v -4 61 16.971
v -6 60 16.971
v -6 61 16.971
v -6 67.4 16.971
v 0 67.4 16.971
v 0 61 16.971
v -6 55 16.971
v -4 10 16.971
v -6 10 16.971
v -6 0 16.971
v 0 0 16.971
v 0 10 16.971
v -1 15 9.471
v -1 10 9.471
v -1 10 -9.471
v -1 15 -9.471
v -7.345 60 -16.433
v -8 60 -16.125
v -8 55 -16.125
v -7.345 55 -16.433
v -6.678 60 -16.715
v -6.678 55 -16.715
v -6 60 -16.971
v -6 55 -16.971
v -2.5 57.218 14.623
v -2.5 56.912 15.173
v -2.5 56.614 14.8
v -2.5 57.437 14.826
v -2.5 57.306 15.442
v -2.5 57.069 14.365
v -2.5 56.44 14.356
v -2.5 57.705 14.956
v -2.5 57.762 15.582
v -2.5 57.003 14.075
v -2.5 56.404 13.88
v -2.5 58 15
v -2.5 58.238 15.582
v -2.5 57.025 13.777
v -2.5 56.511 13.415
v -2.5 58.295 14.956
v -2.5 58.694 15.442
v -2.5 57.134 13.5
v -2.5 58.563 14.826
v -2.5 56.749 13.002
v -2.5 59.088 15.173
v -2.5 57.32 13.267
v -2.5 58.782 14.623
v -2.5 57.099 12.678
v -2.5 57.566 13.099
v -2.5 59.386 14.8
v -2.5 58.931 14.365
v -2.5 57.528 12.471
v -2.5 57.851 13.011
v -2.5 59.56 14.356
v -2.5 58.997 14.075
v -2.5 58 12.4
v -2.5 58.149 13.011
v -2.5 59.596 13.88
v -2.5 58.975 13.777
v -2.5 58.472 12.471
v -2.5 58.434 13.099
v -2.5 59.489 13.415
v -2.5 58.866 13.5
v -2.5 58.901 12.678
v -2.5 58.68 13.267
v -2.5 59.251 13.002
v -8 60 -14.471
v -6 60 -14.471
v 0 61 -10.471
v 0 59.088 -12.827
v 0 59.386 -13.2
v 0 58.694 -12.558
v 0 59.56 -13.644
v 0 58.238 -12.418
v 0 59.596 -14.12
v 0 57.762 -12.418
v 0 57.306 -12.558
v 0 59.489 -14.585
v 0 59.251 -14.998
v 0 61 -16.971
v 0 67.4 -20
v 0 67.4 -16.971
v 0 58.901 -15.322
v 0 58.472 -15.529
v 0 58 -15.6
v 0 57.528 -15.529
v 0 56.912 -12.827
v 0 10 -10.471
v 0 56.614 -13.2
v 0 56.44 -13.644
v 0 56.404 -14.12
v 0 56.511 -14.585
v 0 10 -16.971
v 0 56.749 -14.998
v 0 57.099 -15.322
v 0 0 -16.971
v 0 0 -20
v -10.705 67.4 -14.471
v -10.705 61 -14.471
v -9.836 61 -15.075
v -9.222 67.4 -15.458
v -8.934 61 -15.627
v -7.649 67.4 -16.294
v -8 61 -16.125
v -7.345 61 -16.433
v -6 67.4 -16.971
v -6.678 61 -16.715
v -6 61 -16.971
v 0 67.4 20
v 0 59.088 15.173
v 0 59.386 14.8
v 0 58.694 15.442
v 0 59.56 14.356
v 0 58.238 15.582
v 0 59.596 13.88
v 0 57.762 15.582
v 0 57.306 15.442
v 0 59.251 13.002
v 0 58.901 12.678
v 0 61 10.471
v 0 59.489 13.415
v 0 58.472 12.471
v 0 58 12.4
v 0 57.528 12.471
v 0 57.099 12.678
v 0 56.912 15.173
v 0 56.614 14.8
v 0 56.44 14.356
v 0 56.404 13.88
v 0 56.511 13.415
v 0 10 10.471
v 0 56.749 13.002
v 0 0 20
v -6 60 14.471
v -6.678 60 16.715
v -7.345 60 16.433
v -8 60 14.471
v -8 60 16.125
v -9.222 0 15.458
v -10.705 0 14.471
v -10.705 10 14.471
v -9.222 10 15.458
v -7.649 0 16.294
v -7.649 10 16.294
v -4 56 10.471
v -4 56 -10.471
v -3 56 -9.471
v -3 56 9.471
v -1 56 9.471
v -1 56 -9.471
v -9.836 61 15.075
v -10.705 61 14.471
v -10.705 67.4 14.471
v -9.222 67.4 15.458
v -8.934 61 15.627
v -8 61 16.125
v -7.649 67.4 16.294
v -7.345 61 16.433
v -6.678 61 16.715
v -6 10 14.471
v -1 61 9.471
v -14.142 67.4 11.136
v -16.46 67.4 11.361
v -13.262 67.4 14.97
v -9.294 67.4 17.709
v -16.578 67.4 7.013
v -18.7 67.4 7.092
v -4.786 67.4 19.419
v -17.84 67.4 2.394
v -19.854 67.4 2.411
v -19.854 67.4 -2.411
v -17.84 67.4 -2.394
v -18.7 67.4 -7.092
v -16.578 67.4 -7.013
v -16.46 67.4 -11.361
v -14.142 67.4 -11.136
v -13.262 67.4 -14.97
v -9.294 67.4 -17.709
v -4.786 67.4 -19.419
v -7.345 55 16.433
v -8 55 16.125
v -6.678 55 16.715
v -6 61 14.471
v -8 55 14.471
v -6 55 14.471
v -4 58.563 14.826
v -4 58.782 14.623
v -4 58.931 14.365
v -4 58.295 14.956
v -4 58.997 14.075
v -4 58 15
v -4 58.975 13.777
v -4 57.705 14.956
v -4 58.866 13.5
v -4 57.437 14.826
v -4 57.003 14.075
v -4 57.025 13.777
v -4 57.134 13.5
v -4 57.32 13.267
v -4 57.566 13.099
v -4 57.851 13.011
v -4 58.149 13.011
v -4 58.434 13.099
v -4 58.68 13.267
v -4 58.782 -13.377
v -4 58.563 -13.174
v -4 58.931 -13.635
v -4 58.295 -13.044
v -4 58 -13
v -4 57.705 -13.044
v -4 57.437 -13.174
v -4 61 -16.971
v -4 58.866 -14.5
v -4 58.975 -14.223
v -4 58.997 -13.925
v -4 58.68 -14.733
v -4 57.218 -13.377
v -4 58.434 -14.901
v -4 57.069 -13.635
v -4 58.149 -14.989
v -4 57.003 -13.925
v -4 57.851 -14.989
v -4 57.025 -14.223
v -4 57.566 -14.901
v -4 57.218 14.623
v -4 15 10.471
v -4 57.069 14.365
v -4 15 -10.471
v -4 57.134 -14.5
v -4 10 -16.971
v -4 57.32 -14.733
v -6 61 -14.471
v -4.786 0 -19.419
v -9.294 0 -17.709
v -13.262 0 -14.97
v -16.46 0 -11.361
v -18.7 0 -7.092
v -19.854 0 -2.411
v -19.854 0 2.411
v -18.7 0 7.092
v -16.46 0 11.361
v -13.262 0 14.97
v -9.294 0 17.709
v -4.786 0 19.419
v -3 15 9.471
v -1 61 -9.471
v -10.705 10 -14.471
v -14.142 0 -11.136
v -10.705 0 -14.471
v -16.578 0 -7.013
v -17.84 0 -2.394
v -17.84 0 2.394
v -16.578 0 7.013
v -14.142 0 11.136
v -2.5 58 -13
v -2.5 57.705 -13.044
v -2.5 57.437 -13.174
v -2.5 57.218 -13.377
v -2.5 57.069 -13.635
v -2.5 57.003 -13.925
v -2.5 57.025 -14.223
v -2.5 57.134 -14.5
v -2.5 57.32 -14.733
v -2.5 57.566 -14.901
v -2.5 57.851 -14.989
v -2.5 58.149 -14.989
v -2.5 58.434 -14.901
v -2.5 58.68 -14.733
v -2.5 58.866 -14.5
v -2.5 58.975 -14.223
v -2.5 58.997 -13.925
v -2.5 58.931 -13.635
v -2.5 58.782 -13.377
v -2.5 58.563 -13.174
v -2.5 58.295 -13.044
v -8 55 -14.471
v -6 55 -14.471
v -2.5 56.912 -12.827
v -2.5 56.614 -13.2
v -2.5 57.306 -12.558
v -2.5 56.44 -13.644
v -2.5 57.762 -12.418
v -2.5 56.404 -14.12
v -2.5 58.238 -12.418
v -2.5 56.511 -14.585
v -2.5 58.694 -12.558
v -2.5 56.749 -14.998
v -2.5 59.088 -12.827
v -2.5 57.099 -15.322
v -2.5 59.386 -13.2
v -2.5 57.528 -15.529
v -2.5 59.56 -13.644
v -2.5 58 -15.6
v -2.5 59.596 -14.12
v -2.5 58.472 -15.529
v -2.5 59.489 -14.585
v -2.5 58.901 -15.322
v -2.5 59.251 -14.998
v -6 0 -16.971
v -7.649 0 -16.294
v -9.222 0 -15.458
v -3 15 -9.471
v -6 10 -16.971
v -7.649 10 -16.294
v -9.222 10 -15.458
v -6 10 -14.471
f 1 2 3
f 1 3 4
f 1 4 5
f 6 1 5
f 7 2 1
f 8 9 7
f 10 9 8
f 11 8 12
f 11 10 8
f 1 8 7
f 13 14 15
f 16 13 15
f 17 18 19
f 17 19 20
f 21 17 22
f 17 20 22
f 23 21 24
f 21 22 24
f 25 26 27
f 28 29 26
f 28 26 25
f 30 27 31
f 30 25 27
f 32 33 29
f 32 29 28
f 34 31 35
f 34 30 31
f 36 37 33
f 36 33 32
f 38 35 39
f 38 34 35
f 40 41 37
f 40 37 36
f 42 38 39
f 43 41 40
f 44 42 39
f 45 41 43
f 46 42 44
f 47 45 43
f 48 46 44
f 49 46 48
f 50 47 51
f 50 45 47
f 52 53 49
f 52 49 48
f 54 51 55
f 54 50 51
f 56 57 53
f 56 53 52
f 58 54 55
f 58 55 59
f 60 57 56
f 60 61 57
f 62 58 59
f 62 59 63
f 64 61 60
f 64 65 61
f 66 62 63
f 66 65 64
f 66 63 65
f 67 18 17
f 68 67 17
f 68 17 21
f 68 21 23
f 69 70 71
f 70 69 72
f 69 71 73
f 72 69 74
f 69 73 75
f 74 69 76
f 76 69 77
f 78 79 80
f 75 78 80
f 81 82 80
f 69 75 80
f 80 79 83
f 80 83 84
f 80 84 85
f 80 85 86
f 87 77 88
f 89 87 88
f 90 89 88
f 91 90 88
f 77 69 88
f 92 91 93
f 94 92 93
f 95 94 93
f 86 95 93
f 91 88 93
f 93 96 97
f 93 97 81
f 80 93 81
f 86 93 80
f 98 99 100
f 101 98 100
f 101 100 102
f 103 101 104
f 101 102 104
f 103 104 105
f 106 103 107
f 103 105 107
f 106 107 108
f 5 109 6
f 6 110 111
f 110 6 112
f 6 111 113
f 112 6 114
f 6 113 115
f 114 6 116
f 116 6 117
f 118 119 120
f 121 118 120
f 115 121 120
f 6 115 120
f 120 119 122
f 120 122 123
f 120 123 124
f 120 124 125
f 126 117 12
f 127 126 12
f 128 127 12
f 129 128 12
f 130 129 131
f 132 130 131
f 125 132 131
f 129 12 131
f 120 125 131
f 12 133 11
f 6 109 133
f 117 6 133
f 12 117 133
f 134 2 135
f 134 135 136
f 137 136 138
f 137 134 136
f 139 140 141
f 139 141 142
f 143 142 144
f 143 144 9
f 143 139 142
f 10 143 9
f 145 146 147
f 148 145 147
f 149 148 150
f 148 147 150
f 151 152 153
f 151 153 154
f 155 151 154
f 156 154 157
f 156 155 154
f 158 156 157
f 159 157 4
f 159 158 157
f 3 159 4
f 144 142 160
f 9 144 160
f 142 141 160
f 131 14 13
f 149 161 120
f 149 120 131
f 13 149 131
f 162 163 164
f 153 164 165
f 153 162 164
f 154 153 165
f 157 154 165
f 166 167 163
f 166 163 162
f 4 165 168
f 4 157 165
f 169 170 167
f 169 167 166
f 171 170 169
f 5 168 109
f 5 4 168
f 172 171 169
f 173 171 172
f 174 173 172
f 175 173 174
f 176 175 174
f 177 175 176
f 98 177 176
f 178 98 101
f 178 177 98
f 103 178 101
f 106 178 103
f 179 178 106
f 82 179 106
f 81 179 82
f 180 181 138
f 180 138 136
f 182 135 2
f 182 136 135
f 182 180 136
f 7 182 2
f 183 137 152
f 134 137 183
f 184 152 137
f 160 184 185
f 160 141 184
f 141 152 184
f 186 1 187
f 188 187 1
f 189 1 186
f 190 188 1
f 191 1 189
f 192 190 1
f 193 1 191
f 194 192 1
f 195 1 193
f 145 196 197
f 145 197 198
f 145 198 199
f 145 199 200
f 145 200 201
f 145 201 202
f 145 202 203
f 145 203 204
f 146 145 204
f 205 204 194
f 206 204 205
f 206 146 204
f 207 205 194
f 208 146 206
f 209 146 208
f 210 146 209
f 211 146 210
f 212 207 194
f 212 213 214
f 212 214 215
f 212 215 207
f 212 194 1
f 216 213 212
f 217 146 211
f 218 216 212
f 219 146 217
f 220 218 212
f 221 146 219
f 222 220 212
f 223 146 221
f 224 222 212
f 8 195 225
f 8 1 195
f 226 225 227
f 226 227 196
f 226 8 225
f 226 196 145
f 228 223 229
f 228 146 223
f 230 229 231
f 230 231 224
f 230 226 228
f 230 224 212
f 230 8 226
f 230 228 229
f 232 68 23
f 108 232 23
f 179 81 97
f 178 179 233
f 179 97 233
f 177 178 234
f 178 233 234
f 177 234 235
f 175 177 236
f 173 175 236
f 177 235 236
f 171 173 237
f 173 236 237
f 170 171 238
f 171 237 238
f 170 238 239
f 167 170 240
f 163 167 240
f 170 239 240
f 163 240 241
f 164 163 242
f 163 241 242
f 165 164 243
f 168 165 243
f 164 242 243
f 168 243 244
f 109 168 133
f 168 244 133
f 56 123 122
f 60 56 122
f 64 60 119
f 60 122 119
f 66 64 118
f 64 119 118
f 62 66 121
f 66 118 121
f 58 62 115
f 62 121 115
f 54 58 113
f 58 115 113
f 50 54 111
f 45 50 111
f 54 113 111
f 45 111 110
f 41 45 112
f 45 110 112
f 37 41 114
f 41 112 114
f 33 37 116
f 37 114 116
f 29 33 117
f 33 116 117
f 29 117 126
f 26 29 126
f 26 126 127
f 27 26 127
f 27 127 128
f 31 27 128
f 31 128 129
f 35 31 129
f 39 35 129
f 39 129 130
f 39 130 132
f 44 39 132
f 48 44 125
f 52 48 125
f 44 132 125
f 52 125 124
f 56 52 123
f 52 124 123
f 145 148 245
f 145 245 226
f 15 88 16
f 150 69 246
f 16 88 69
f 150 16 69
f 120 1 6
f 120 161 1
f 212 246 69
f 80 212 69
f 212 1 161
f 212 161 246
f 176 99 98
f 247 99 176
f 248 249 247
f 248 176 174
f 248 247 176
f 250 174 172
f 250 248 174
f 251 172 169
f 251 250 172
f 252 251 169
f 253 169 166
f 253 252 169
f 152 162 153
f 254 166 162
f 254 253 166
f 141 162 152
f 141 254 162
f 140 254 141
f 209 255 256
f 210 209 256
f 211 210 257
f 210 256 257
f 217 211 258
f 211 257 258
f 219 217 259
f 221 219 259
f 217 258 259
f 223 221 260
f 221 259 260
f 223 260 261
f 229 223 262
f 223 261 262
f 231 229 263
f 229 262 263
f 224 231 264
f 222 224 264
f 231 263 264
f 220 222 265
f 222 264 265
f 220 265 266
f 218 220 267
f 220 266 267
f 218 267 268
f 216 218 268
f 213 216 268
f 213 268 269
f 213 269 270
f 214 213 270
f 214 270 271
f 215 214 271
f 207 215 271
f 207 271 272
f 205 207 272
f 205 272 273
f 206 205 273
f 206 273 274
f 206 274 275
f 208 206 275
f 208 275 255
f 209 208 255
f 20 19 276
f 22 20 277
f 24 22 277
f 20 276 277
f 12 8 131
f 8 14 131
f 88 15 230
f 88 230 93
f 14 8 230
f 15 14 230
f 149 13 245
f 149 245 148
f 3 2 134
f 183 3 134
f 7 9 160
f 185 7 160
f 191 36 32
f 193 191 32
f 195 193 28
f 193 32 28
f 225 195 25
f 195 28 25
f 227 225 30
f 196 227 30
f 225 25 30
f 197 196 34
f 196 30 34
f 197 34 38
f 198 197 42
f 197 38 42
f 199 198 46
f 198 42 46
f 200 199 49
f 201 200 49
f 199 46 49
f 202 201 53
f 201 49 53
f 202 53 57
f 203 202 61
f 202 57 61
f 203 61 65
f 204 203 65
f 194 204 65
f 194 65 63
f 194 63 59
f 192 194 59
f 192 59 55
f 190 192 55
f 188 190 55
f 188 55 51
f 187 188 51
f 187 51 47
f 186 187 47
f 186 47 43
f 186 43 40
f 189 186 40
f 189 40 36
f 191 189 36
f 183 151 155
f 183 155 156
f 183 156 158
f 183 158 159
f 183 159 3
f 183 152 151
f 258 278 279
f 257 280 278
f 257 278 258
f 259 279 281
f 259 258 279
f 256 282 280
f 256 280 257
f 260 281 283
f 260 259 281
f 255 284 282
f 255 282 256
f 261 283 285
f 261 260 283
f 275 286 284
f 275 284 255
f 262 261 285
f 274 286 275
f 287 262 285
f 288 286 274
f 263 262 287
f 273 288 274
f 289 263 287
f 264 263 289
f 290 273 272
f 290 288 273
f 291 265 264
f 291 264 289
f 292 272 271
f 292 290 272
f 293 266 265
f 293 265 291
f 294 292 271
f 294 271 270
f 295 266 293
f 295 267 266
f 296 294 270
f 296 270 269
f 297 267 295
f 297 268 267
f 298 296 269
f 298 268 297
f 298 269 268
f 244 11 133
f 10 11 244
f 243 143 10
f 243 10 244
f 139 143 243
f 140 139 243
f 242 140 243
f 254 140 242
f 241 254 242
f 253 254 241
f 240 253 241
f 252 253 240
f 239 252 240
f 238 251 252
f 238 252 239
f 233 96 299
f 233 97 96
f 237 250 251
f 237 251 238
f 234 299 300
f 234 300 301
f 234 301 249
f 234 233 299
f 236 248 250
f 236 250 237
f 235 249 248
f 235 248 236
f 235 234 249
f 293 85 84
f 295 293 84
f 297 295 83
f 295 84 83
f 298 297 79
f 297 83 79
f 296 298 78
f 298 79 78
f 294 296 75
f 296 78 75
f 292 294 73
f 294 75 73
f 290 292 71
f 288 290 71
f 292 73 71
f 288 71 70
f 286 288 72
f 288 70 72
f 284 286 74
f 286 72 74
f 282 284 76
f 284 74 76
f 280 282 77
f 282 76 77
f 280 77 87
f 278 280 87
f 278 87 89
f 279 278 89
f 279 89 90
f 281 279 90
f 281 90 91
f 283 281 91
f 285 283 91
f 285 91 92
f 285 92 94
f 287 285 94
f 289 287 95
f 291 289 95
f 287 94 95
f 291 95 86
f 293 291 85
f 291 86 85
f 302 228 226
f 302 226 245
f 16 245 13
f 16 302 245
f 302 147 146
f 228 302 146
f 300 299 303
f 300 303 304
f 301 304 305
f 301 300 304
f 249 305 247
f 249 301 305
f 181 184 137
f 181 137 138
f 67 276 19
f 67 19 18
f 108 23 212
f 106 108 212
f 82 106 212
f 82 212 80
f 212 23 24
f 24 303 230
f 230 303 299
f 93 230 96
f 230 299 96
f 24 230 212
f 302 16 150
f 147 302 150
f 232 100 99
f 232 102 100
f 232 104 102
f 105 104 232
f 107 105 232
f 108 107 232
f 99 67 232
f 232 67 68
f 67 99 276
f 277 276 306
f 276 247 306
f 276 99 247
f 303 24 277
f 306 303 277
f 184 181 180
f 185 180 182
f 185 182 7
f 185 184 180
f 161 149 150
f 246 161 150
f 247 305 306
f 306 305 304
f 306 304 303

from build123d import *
from build123d.topology import SkipClean

# Parameters (mm, degrees)
EXTRUDE_1_DEPTH           = 70
SKETCH_3_R                = 1
CUT_EXTRUDE_2_DEPTH       = 4
CUT_EXTRUDE_START         = 70
SKETCH_5_W                = 4
SKETCH_5_H                = 33.941125496
CUT_EXTRUDE_4_DEPTH       = 9
EXTRUDE_2_DEPTH           = 70
SKETCH_7_W                = 4
SKETCH_7_H                = 33.941125496
CUT_EXTRUDE_5_DEPTH       = 10
EXTRUDE_START             = 61
SKETCH_8_W                = 6
SKETCH_8_H                = 2.5
EXTRUDE_3_DEPTH           = 1
EXTRUDE_4_DEPTH           = 70
SKETCH_11_W               = 6
SKETCH_11_H               = 2.5
EXTRUDE_5_DEPTH           = 9
CUT_EXTRUDE_START_2       = 16.970563
SKETCH_12_W               = 2
SKETCH_12_H               = 1
CUT_EXTRUDE_6_DEPTH       = 33.941125497
CUT_EXTRUDE_START_3       = 10
SKETCH_14_W               = 1
SKETCH_14_H               = 20.941125496
CUT_EXTRUDE_8_DEPTH       = 51
CUT_EXTRUDE_START_4       = -1
SKETCH_15_W               = 18.941125496
SKETCH_15_H               = 41
CUT_EXTRUDE_9_DEPTH       = 2
SKETCH_17_R               = 1.6
CUT_EXTRUDE_10_DEPTH      = 2.5
EXTRUDE_11_DEPTH          = 51
EXTRUDE_12_DEPTH          = 5
EXTRUDE_START_2           = 10
EXTRUDE_13_DEPTH          = 5
CUT_EXTRUDE_START_5       = 55
CUT_EXTRUDE_11_DEPTH      = 6
CUT_EXTRUDE_12_REACH      = 77.498
CUT_EXTRUDE_12_END_RADIUS = 18
SKETCH_24_W               = 2
SKETCH_24_H               = 6
CUT_EXTRUDE_13_DEPTH      = 10
CUT_EXTRUDE_START_6       = 61
CUT_EXTRUDE_18_DEPTH      = 9
EXTRUDE_START_3           = 60
EXTRUDE_16_DEPTH          = 1
EXTRUDE_START_4           = 70
EXTRUDE_17_DEPTH          = 2.4
CUT_EXTRUDE_START_7       = 67.4
CUT_EXTRUDE_19_DEPTH      = 5
SKETCH_33_W               = 2
SKETCH_33_H               = 33.941125496
CUT_EXTRUDE_20_DEPTH      = 61


# Read off the part's stored shape, not the designer's step: 切除-拉伸11
with BuildPart() as part:
    # 草图1 → 凸台-拉伸1 (new body)
    with BuildSketch(Plane(origin=(0, 0, 0), x_dir=(1, 0, 0), z_dir=(0, 1, 0))):
        with BuildLine():
            Line((0, 20), (0, -20))
            ThreePointArc((0, -20), (-20, 0), (0, 20))
        make_face()
        with BuildLine():
            Line((-4, -17.549928775), (-4, 17.549928775))
            ThreePointArc((-4, 17.549928775), (-18, 0), (-4, -17.549928775))
        make_face(mode=Mode.SUBTRACT)
    extrude(amount=EXTRUDE_1_DEPTH)

    # 草图3 → 切除-拉伸2 (cut)
    with BuildSketch(Plane(origin=(0, 0, 0), x_dir=(0, 0, -1), z_dir=(1, 0, 0))):
        with Locations(Location((-14, 58, 0), (0, 0, 180))):
            Circle(SKETCH_3_R)
        with Locations(Location((14, 58, 0), (0, 0, 180))):
            Circle(SKETCH_3_R)
    extrude(amount=-CUT_EXTRUDE_2_DEPTH, mode=Mode.SUBTRACT)

    # 草图5 → 切除-拉伸4 (cut)
    with BuildSketch(Plane(origin=(0, 0, 0), x_dir=(1, 0, 0), z_dir=(0, 1, 0)).offset(CUT_EXTRUDE_START)):
        with Locations((-2, 0)):
            Rectangle(SKETCH_5_W, SKETCH_5_H)
    extrude(amount=-CUT_EXTRUDE_4_DEPTH, mode=Mode.SUBTRACT)

    # 草图6 → 凸台-拉伸2 (add)
    with BuildSketch(Plane(origin=(0, 0, 0), x_dir=(1, 0, 0), z_dir=(0, 1, 0))):
        with BuildLine():
            Line((-4, 16.970562748), (-6, 16.970562748))
            ThreePointArc((-6, 16.970562748), (-3.043835617, 17.740774074), (0, 18))
            Line((0, 18), (0, 16.970562748))
            Line((0, 16.970562748), (-4, 16.970562748))
        make_face()
        with BuildLine():
            Line((-4, -16.970562748), (-6, -16.970562748))
            ThreePointArc((-6, -16.970562748), (-3.043835617, -17.740774074), (0, -18))
            Line((0, -18), (0, -16.970562748))
            Line((0, -16.970562748), (-4, -16.970562748))
        make_face()
    extrude(amount=EXTRUDE_2_DEPTH)

    # 草图7 → 切除-拉伸5 (cut)
    with BuildSketch(Plane(origin=(0, 0, 0), x_dir=(1, 0, 0), z_dir=(0, 1, 0))):
        with Locations((-2, 0)):
            Rectangle(SKETCH_7_W, SKETCH_7_H)
    extrude(amount=CUT_EXTRUDE_5_DEPTH, mode=Mode.SUBTRACT)

    # 草图8 → 凸台-拉伸3 (add)
    with BuildSketch(Plane(origin=(0, 0, 0), x_dir=(1, 0, 0), z_dir=(0, 1, 0)).offset(EXTRUDE_START)):
        with Locations((-3, 15.720562748)):
            Rectangle(SKETCH_8_W, SKETCH_8_H)
        with Locations((-3, -15.720562748)):
            Rectangle(SKETCH_8_W, SKETCH_8_H)
    extrude(amount=-EXTRUDE_3_DEPTH)

    # 草图10 → 凸台-拉伸4 (add)
    with BuildSketch(Plane(origin=(0, 0, 0), x_dir=(1, 0, 0), z_dir=(0, 1, 0))):
        with BuildLine():
            Line((-6, 16.970562748), (-6, 14.470562748))
            Line((-6, 14.470562748), (-10.705270372, 14.470562748))
            ThreePointArc((-10.705270372, 14.470562748), (-8.445650629, 15.895627872), (-6, 16.970562748))
        make_face()
        with BuildLine():
            Line((-6, -14.470562748), (-10.705270372, -14.470562748))
            ThreePointArc((-10.705270372, -14.470562748), (-8.445650629, -15.895627872), (-6, -16.970562748))
            Line((-6, -16.970562748), (-6, -14.470562748))
        make_face()
    extrude(amount=EXTRUDE_4_DEPTH)

    # 草图11 → 凸台-拉伸5 (add)
    with BuildSketch(Plane(origin=(0, 0, 0), x_dir=(1, 0, 0), z_dir=(0, 1, 0)).offset(EXTRUDE_START)):
        with Locations((-3, 15.720562748)):
            Rectangle(SKETCH_11_W, SKETCH_11_H)
        with Locations((-3, -15.720562748)):
            Rectangle(SKETCH_11_W, SKETCH_11_H)
    extrude(amount=EXTRUDE_5_DEPTH)

    # 草图12 → 切除-拉伸6 (cut)
    with SkipClean():  # the faces are left unmerged after this step: merging them gives an invalid solid
        with BuildSketch(Plane.XY.offset(CUT_EXTRUDE_START_2)):
            with Locations((-5, 60.5)):
                Rectangle(SKETCH_12_W, SKETCH_12_H)
        extrude(amount=-CUT_EXTRUDE_6_DEPTH, mode=Mode.SUBTRACT)

    # 草图14 → 切除-拉伸8 (cut)
    with SkipClean():  # the faces are left unmerged after this step: merging them gives an invalid solid
        with BuildSketch(Plane(origin=(0, 0, 0), x_dir=(1, 0, 0), z_dir=(0, 1, 0)).offset(CUT_EXTRUDE_START_3)):
            with Locations((-3.5, 0)):
                Rectangle(SKETCH_14_W, SKETCH_14_H)
            with Locations((-0.5, 0)):
                Rectangle(SKETCH_14_W, SKETCH_14_H)
        extrude(amount=CUT_EXTRUDE_8_DEPTH, mode=Mode.SUBTRACT)

    # 草图15 → 切除-拉伸9 (cut)
    with SkipClean():  # the faces are left unmerged after this step: merging them gives an invalid solid
        with BuildSketch(Plane(origin=(0, 0, 0), x_dir=(0, 0, -1), z_dir=(1, 0, 0)).offset(CUT_EXTRUDE_START_4)):
            with Locations((0, 35.5)):
                Rectangle(SKETCH_15_W, SKETCH_15_H)
        extrude(amount=-CUT_EXTRUDE_9_DEPTH, mode=Mode.SUBTRACT)

    # 草图17 → 切除-拉伸10 (cut)
    with SkipClean():  # the faces are left unmerged after this step: merging them gives an invalid solid
        with BuildSketch(Plane(origin=(0, 0, 0), x_dir=(0, 0, -1), z_dir=(1, 0, 0))):
            with Locations((-14, 58)):
                Circle(SKETCH_17_R)
            with Locations((14, 58)):
                Circle(SKETCH_17_R)
        extrude(amount=-CUT_EXTRUDE_10_DEPTH, mode=Mode.SUBTRACT)

    # 草图20 → 凸台-拉伸11 (add)
    with SkipClean():  # the faces are left unmerged after this step: merging them gives an invalid solid
        with BuildSketch(Plane(origin=(0, 0, 0), x_dir=(1, 0, 0), z_dir=(0, 1, 0)).offset(EXTRUDE_START)):
            Polygon((-1, 10.470562748), (0, 10.470562748), (-1, 9.470562748), align=None)
            Polygon((-4, 10.470562748), (-3, 10.470562748), (-3, 9.470562748), align=None)
            Polygon((-4, -10.470562748), (-3, -10.470562748), (-3, -9.470562748), align=None)
            Polygon((0, -10.470562748), (-1, -10.470562748), (-1, -9.470562748), align=None)
        extrude(amount=-EXTRUDE_11_DEPTH)

    # 草图21 → 凸台-拉伸12 (add)
    with SkipClean():  # the faces are left unmerged after this step: merging them gives an invalid solid
        with BuildSketch(Plane(origin=(0, 0, 0), x_dir=(1, 0, 0), z_dir=(0, 1, 0)).offset(EXTRUDE_START)):
            Polygon((-4, 10.470562748), (-4, -10.470562748), (-3, -9.470562748), (-3, 9.470562748), align=None)
        extrude(amount=-EXTRUDE_12_DEPTH)

    # 草图22 → 凸台-拉伸13 (add)
    with SkipClean():  # the faces are left unmerged after this step: merging them gives an invalid solid
        with BuildSketch(Plane(origin=(0, 0, 0), x_dir=(1, 0, 0), z_dir=(0, 1, 0)).offset(EXTRUDE_START_2)):
            Polygon((-4, 10.470562748), (-4, -10.470562748), (-3, -9.470562748), (-3, 9.470562748), align=None)
        extrude(amount=EXTRUDE_13_DEPTH)

    # 切除-拉伸11 outline → 切除-拉伸11 (cut)
    with SkipClean():  # the faces are left unmerged after this step: merging them gives an invalid solid
        with BuildSketch(Plane(origin=(0, 0, 0), x_dir=(1, 0, 0), z_dir=(0, 1, 0)).offset(CUT_EXTRUDE_START_5)):
            with BuildLine():
                ThreePointArc((-8, -16.124515497), (-7.012770422, -16.577727559), (-6, -16.970562748))
                Line((-6, -16.970562748), (-6, -14.470562748))
                Line((-6, -14.470562748), (-8, -14.470562748))
                Line((-8, -14.470562748), (-8, -16.124515497))
            make_face()
        extrude(amount=CUT_EXTRUDE_11_DEPTH, mode=Mode.SUBTRACT)

    # 切除-拉伸12: up to this cylinder (the profile starts inside it)
    with SkipClean():  # the faces are left unmerged after this step: merging them gives an invalid solid
        cut_extrude_12_end = Plane(origin=(0, 58, 0), z_dir=(0, -1, 0)) * Cylinder(CUT_EXTRUDE_12_END_RADIUS, 191.996, mode=Mode.PRIVATE)
        # 草图24 → 切除-拉伸12 (cut, up to the surface)
        with BuildSketch(Plane.XY, mode=Mode.PRIVATE) as cut_extrude_12_sk1:
            with Locations((-7, 58)):
                Rectangle(SKETCH_24_W, SKETCH_24_H)
        cut_extrude_12_tool1 = extrude(cut_extrude_12_sk1.sketch, amount=-CUT_EXTRUDE_12_REACH, mode=Mode.PRIVATE) & cut_extrude_12_end
        add(cut_extrude_12_tool1.solids().sort_by_distance((-7, 58, 0))[0], mode=Mode.SUBTRACT)

    # 草图25 → 切除-拉伸13 (cut)
    with SkipClean():  # the faces are left unmerged after this step: merging them gives an invalid solid
        with BuildSketch(Plane(origin=(0, 0, 0), x_dir=(1, 0, 0), z_dir=(0, 1, 0))):
            with BuildLine():
                Line((-6, -16.970562748), (-6, -14.470562748))
                Line((-6, -14.470562748), (-10.705270372, -14.470562748))
                ThreePointArc((-10.705270372, -14.470562748), (-8.445650629, -15.895627872), (-6, -16.970562748))
            make_face()
            with BuildLine():
                Line((-10.705270372, 14.470562748), (-6, 14.470562748))
                Line((-6, 14.470562748), (-6, 16.970562748))
                ThreePointArc((-6, 16.970562748), (-8.445650629, 15.895627872), (-10.705270372, 14.470562748))
            make_face()
        extrude(amount=CUT_EXTRUDE_13_DEPTH, mode=Mode.SUBTRACT)

    # 草图29 → 切除-拉伸18 (cut)
    with SkipClean():  # the faces are left unmerged after this step: merging them gives an invalid solid
        with BuildSketch(Plane(origin=(0, 0, 0), x_dir=(1, 0, 0), z_dir=(0, 1, 0)).offset(CUT_EXTRUDE_START_6)):
            with BuildLine():
                Line((0, -16.970562748), (0, -14.470562748))
                Line((0, -14.470562748), (-10.705270372, -14.470562748))
                ThreePointArc((-10.705270372, -14.470562748), (-8.445650629, -15.895627872), (-6, -16.970562748))
                Line((-6, -16.970562748), (0, -16.970562748))
            make_face()
            with BuildLine():
                Line((-6, 16.970562748), (0, 16.970562748))
                Line((0, 16.970562748), (0, 14.470562748))
                Line((0, 14.470562748), (-10.705270372, 14.470562748))
                ThreePointArc((-10.705270372, 14.470562748), (-8.445650629, 15.895627872), (-6, 16.970562748))
            make_face()
        extrude(amount=CUT_EXTRUDE_18_DEPTH, mode=Mode.SUBTRACT)

    # 草图30 → 凸台-拉伸16 (add)
    with BuildSketch(Plane(origin=(0, 0, 0), x_dir=(1, 0, 0), z_dir=(0, 1, 0)).offset(EXTRUDE_START_3)):
        with BuildLine():
            Line((-8, 16.124515497), (-8, 14.470562748))
            Line((-8, 14.470562748), (-4, 14.470562748))
            Line((-4, 14.470562748), (-4, 16.970562748))
            Line((-4, 16.970562748), (-6, 16.970562748))
            ThreePointArc((-6, 16.970562748), (-7.012770422, 16.577727559), (-8, 16.124515497))
        make_face()
        with BuildLine():
            Line((-8, -16.124515497), (-8, -14.470562748))
            Line((-8, -14.470562748), (-4, -14.470562748))
            Line((-4, -14.470562748), (-4, -16.970562748))
            Line((-4, -16.970562748), (-6, -16.970562748))
            ThreePointArc((-6, -16.970562748), (-7.012770422, -16.577727559), (-8, -16.124515497))
        make_face()
    extrude(amount=EXTRUDE_16_DEPTH)

    # 草图31 → 凸台-拉伸17 (add)
    with BuildSketch(Plane(origin=(0, 0, 0), x_dir=(1, 0, 0), z_dir=(0, 1, 0)).offset(EXTRUDE_START_4)):
        with BuildLine():
            Line((0, -20), (0, -16.970562748))
            Line((0, -16.970562748), (-6, -16.970562748))
            ThreePointArc((-6, -16.970562748), (-18, 0), (-6, 16.970562748))
            Line((-6, 16.970562748), (0, 16.970562748))
            Line((0, 16.970562748), (0, 20))
            ThreePointArc((0, 20), (-20, 0), (0, -20))
        make_face()
    extrude(amount=EXTRUDE_17_DEPTH)

    # 草图32 → 切除-拉伸19 (cut)
    with BuildSketch(Plane(origin=(0, 0, 0), x_dir=(1, 0, 0), z_dir=(0, 1, 0)).offset(CUT_EXTRUDE_START_7)):
        with BuildLine():
            Line((0, 16.970562748), (0, 20))
            ThreePointArc((0, 20), (-20, 0), (0, -20))
            Line((0, -20), (0, -16.970562748))
            Line((0, -16.970562748), (-6, -16.970562748))
            ThreePointArc((-6, -16.970562748), (-18, 0), (-6, 16.970562748))
            Line((-6, 16.970562748), (0, 16.970562748))
        make_face()
    extrude(amount=CUT_EXTRUDE_19_DEPTH, mode=Mode.SUBTRACT)

    # 草图33 → 切除-拉伸20 (cut)
    with BuildSketch(Plane(origin=(0, 0, 0), x_dir=(1, 0, 0), z_dir=(0, 1, 0))):
        with Locations((-5, 0)):
            Rectangle(SKETCH_33_W, SKETCH_33_H)
    extrude(amount=CUT_EXTRUDE_20_DEPTH, mode=Mode.SUBTRACT)


solid = part.part
